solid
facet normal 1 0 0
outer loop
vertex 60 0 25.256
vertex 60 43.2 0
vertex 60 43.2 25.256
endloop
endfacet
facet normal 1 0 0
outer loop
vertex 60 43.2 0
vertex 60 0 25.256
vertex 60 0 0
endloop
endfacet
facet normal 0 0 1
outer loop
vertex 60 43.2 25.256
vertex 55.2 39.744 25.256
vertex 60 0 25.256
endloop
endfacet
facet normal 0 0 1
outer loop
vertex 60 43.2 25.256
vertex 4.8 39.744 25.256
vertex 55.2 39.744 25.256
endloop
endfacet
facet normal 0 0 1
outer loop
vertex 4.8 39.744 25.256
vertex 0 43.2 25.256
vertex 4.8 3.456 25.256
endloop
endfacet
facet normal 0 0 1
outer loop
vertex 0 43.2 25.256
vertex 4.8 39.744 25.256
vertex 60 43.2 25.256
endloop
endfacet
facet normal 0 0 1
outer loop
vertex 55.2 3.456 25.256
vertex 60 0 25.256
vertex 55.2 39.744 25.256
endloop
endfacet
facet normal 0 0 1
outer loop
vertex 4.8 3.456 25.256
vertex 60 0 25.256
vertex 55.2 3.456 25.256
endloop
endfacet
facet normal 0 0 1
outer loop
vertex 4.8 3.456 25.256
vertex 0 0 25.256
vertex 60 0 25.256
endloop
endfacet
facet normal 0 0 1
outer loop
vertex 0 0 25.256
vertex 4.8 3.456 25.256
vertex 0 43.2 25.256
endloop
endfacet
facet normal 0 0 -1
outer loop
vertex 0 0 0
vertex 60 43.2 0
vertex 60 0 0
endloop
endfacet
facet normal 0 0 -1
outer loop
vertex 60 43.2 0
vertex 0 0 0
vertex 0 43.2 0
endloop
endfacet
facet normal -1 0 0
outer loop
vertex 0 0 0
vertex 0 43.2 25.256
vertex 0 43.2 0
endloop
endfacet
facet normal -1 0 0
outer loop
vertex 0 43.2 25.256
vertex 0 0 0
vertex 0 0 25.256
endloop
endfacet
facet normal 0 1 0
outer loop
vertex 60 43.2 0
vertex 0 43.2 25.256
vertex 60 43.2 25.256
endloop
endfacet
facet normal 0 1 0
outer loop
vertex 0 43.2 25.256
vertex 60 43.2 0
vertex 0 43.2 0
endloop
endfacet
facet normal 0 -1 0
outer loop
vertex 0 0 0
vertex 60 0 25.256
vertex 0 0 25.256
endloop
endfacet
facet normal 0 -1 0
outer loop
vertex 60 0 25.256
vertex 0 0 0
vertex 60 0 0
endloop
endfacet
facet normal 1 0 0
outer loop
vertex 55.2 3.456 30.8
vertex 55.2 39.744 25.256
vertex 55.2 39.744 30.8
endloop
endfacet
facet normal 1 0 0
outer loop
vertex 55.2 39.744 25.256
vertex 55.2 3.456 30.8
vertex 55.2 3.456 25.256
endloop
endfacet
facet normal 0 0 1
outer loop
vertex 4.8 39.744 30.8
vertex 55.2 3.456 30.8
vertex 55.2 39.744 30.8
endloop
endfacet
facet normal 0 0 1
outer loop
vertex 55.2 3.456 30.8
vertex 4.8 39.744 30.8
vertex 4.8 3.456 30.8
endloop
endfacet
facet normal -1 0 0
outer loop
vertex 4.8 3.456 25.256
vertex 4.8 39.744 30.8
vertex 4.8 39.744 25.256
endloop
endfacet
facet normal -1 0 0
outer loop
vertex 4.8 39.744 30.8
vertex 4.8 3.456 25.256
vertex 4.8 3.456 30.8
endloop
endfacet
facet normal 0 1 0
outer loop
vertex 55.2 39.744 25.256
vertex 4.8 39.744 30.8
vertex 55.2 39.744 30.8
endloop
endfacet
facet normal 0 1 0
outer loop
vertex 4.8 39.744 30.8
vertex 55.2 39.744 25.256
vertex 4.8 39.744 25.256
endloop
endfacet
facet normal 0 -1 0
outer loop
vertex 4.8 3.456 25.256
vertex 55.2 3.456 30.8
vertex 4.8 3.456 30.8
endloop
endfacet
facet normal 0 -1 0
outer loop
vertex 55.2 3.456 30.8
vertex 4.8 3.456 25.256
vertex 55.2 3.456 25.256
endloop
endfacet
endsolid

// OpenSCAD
// Troféu — modelo próprio do Multiferramenta 3D
// Partes: "pedestal", "topo" (taça, estrela ou logo) e "texto" (placa da frente) — em pé, pronto pra multicor
texto = "CAMPEÃO"; linha2 = "2026"; fonte = "Poppins:style=Bold";
topo = "taca";          // taca | estrela | logo
logo = []; lw = 40; lh = 40;
altura = 140;           // altura total aproximada
largura = 60; relevo = 1;
parte = "pedestal";
$fn = 72;

ph = altura * 0.22;                 // altura do pedestal
pw = largura; pd = largura * 0.72;
th = altura - ph;                   // altura do topo
module estrela(r) polygon([for (i = [0 : 9]) let(a = 90 + i * 36, rr = i % 2 == 0 ? r : r * 0.42) [rr * cos(a), rr * sin(a)]]);
module pedestal() { cube([pw, pd, ph * 0.82], center = false); translate([pw * 0.08, pd * 0.08, ph * 0.82]) cube([pw * 0.84, pd * 0.84, ph * 0.18]); }
module taca() {
  s = min(th / 100, pw * 0.84 / 2 / 28);     // a boca da taça cabe no topo do pedestal
  rotate_extrude() polygon([[0, 0], [18 * s, 0], [18 * s, 3 * s], [6 * s, 6 * s], [4 * s, 10 * s], [4 * s, 34 * s], [8 * s, 38 * s],
    [24 * s, 54 * s], [28 * s, 80 * s], [28 * s, 96 * s], [25.6 * s, 96 * s], [25.6 * s, 81 * s], [21.8 * s, 56 * s], [6 * s, 40 * s], [0, 40 * s]]);
}
cx = pw / 2; cy = pd / 2; z0 = ph;
// estrela/logo: chapa em pé de 6 mm com um pezinho de apoio
module em_pe(alt) { translate([0, 3, 0]) rotate([90, 0, 0]) linear_extrude(6) translate([0, alt / 2 + 6]) children(); translate([0, 0, 3]) cube([min(alt * 0.4, pw * 0.7), 12, 6], center = true); }
if (parte == "pedestal") pedestal();
else if (parte == "topo") translate([cx, cy, z0]) {
  if (topo == "taca") taca();
  else if (topo == "estrela") let(r = min(th * 0.42, pw * 0.55)) em_pe(2 * r) estrela(r);
  else if (topo == "logo") let(k = min(th * 0.85 / max(lh, 1), pw * 1.05 / max(lw, 1))) em_pe(lh * k) scale(k) for (p = logo) polygon(points = p[0], paths = p[1]);
}
if (parte == "texto") translate([cx, 0, ph * 0.41]) rotate([90, 0, 0]) linear_extrude(relevo) {
  translate([0, len(linha2) > 0 ? ph * 0.12 : 0]) resize([min(pw * 0.86, len(texto) * pw * 0.11), 0], auto = true) text(texto, font = fonte, size = 10, halign = "center", valign = "center");
  if (len(linha2) > 0) translate([0, -ph * 0.2]) resize([0, ph * 0.2], auto = true) text(linha2, font = fonte, size = 10, halign = "center", valign = "center");
}
